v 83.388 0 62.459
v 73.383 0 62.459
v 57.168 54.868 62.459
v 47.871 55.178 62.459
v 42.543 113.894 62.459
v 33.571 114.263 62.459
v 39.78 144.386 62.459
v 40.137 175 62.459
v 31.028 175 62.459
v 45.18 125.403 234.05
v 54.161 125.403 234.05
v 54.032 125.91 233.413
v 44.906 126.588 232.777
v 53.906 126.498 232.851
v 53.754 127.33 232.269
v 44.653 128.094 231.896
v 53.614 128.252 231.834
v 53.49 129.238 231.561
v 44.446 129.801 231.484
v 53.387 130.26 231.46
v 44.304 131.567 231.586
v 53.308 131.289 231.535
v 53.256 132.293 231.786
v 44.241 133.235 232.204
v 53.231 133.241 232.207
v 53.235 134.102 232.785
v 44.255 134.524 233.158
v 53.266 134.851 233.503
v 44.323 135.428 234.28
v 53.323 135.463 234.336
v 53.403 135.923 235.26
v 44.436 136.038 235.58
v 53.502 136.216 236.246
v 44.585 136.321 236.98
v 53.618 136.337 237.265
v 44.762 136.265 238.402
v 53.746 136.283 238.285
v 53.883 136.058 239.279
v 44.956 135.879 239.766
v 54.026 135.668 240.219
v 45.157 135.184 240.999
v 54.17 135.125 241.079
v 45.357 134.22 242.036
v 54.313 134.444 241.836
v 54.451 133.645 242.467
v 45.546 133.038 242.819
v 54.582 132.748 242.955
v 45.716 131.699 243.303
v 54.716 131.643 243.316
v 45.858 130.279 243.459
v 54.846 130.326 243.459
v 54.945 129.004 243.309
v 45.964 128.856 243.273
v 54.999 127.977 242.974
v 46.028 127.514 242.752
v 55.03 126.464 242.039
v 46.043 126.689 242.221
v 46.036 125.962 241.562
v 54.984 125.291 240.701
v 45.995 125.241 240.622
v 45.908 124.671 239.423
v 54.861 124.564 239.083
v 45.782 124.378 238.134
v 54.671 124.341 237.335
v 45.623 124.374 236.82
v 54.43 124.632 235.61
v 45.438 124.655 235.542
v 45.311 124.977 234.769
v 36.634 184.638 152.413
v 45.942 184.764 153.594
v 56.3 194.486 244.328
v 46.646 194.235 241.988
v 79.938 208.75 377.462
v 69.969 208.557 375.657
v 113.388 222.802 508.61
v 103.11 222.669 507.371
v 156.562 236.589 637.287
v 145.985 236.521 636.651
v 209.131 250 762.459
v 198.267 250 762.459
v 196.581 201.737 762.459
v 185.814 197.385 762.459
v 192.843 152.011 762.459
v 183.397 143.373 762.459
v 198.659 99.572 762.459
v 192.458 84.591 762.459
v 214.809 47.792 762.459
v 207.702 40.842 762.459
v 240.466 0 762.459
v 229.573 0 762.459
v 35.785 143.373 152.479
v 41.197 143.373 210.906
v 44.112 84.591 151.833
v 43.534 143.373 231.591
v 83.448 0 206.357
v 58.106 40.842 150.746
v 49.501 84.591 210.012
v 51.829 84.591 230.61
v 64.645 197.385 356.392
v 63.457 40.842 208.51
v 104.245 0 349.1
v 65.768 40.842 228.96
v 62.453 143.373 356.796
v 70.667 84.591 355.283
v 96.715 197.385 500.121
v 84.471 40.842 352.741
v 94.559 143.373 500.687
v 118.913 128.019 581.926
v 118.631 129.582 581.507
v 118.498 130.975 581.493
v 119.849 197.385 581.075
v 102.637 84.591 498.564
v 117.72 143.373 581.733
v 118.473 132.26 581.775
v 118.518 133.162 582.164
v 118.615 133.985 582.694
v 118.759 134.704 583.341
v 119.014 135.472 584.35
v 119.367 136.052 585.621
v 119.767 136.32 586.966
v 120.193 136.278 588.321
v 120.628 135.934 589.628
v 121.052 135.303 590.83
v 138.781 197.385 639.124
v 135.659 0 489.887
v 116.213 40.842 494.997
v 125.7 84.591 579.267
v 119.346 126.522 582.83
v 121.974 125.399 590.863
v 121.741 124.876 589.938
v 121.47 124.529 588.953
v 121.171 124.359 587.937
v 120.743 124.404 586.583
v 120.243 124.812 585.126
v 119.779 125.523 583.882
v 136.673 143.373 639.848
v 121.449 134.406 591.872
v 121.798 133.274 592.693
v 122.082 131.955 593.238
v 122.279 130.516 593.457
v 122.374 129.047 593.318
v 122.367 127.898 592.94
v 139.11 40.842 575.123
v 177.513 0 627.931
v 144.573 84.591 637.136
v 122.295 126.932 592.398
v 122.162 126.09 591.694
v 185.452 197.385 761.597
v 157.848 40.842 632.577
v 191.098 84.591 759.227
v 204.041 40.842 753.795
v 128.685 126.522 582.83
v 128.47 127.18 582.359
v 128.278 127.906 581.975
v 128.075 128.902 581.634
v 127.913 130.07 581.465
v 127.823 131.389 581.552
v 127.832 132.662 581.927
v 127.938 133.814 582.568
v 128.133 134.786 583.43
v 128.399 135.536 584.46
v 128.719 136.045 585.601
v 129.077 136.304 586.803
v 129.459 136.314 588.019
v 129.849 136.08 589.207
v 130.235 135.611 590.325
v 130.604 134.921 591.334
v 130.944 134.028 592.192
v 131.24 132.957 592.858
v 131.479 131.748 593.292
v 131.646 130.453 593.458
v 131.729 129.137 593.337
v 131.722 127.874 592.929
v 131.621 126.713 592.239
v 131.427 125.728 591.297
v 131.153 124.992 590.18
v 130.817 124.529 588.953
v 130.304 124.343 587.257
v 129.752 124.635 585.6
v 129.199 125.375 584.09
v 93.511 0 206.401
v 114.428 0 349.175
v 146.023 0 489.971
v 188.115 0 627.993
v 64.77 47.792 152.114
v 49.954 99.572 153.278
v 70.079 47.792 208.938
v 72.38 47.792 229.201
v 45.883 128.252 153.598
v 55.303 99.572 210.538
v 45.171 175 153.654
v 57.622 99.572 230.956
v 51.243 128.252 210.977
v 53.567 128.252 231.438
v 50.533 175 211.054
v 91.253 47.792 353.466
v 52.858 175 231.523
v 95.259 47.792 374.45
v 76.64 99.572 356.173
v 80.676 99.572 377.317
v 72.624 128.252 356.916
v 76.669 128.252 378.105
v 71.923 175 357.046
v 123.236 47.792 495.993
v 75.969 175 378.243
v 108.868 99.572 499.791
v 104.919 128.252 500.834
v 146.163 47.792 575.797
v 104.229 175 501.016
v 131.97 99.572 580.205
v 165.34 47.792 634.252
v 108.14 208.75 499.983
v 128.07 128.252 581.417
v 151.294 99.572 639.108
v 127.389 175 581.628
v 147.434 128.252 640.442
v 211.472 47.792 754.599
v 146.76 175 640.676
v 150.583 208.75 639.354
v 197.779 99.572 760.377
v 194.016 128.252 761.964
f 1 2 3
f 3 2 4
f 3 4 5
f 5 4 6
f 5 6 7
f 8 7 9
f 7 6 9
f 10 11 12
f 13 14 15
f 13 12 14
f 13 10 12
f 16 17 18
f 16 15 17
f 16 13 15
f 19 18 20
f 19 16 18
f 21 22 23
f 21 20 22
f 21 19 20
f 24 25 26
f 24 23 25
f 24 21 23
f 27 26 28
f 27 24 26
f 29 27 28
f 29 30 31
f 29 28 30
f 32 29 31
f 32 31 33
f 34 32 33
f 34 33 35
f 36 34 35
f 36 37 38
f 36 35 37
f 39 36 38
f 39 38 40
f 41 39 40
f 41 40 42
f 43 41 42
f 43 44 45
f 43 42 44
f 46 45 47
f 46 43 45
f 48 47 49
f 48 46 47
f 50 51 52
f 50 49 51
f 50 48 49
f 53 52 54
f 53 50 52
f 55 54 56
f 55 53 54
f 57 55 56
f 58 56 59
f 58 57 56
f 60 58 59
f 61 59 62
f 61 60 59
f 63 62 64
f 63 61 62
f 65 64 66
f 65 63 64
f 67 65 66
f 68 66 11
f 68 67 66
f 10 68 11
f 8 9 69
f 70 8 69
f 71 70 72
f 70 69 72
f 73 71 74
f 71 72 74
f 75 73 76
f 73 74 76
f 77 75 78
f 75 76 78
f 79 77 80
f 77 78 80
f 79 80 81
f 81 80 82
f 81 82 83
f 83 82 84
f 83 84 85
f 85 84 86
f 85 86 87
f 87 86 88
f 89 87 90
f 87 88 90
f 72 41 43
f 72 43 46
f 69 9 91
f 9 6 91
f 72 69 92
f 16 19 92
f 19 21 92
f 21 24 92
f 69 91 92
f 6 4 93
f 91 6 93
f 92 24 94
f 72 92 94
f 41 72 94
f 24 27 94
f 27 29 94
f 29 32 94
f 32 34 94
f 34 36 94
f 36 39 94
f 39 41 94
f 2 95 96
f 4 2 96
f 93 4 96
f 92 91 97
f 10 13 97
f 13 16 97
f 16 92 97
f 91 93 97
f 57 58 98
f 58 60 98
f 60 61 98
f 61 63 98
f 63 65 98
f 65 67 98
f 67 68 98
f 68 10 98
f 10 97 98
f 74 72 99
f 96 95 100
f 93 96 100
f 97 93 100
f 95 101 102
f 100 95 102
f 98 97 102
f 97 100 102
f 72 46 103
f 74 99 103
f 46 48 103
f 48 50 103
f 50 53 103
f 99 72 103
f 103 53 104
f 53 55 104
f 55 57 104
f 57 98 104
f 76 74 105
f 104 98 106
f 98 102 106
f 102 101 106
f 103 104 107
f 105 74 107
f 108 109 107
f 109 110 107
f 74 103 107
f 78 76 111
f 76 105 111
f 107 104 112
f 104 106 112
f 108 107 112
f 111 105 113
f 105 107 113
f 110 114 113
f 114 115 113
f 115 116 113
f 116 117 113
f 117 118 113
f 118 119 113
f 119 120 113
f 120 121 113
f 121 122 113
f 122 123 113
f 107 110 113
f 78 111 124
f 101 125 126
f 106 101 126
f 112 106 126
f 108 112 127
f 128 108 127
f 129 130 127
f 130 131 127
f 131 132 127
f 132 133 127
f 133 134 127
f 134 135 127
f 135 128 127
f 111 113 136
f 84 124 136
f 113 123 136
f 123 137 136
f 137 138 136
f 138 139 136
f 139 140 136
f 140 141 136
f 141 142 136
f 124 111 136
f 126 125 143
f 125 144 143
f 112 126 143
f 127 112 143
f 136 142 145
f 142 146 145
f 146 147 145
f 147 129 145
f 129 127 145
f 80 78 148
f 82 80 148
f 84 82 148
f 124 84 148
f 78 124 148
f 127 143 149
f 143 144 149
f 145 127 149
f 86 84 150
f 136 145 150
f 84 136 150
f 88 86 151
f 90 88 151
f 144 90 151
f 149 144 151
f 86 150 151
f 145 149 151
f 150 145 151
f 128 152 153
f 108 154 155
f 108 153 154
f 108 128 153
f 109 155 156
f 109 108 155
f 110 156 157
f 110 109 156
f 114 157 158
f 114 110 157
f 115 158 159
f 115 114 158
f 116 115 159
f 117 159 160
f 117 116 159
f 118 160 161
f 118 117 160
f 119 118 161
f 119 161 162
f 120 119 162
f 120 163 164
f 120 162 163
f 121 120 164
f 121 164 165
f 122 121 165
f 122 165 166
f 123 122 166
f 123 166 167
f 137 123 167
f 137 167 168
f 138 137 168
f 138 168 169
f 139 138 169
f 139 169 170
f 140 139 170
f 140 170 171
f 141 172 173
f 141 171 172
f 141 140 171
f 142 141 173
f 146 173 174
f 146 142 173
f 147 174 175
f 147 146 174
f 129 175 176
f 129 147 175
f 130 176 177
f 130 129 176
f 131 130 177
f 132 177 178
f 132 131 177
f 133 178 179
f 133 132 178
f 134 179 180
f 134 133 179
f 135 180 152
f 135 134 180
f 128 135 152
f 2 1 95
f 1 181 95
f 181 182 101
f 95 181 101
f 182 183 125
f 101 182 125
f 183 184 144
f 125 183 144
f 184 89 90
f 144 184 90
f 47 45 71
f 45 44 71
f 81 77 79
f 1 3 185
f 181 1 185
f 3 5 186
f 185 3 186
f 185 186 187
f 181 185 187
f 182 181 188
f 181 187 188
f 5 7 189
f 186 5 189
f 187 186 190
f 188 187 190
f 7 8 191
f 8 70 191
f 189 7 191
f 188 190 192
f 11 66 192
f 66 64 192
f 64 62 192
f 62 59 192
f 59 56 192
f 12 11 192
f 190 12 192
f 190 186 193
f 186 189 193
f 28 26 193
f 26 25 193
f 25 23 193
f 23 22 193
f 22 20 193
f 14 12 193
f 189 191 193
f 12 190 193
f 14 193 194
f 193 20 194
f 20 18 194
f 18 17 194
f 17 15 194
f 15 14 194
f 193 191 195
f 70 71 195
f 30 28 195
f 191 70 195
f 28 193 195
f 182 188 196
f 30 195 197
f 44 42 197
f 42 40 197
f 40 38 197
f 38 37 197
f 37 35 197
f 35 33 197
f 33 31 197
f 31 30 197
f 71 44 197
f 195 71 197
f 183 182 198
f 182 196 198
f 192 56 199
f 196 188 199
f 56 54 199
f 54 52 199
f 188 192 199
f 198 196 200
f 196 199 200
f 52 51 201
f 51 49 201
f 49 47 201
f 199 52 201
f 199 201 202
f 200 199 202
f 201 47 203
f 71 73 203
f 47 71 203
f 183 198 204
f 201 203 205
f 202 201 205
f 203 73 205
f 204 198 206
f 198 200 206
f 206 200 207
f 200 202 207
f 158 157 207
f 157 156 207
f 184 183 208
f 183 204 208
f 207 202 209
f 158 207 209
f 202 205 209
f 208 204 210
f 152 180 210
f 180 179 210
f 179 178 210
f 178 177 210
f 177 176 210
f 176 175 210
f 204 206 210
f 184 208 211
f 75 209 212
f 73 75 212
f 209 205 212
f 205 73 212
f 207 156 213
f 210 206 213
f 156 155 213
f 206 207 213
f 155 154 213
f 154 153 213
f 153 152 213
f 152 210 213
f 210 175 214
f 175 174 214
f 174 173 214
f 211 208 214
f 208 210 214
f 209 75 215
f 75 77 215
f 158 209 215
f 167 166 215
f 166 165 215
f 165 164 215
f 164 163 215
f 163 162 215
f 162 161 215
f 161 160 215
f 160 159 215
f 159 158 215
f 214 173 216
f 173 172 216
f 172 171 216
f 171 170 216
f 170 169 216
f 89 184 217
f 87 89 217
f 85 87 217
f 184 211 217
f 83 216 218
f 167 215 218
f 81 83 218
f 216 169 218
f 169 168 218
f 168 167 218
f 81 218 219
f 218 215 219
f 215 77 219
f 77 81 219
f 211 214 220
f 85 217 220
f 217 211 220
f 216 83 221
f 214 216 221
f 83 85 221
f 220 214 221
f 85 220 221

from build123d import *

# Parameters (mm, degrees)
REVOLVE1_ANGLE          = 88
CUT_EXTRUDE2_DEPTH      = 2771.780439466
CUT_EXTRUDE2_DEPTH_BACK = 2771.780439466
SKETCH5_W               = 5800.528681758
SKETCH5_H               = 2435.889164845
CUT_EXTRUDE4_DEPTH      = 838.656303446
CUT_EXTRUDE4_DEPTH_BACK = 838.656303446
SKETCH6_R               = 6


with BuildPart() as part:
    # Sketch2 → Revolve1 (revolve)
    with BuildSketch(Plane.XY):
        with BuildLine():
            Line((72.370392529, 0), (82.370392529, 0))
            ThreePointArc((82.370392529, 0), (40.524594063, 121.838677192), (53.578690935, 250))
            Line((53.578690935, 250), (43.578690935, 250))
            ThreePointArc((43.578690935, 250), (31.595154891, 121.961970263), (72.370392529, 0))
        make_face()
    revolve(axis=Axis((2000, -13.371705106, 0), (0, 1, 0)), revolution_arc=REVOLVE1_ANGLE)

    # Sketch5 → Cut-Extrude2 (cut, two sides: drawn at the far end of the back side and taken through both)
    with BuildSketch(Plane(origin=(0, 0, 0), x_dir=(0, 0, -1), z_dir=(1, 0, 0)).offset(-CUT_EXTRUDE2_DEPTH_BACK)):
        with Locations((76.037885341, -87.116535175)):
            Rectangle(SKETCH5_W, SKETCH5_H)
        Polygon((-762.459239957, 250), (-762.459239957, 0), (-62.459239957, 0), (-62.459239957, 175), align=None, mode=Mode.SUBTRACT)
    extrude(amount=CUT_EXTRUDE2_DEPTH + CUT_EXTRUDE2_DEPTH_BACK, mode=Mode.SUBTRACT)

    # Sketch6 → Cut-Extrude4 (cut, two sides: drawn at the far end of the back side and taken through both)
    with BuildSketch(Plane(origin=(0, 0, 0), x_dir=(0, 0, -1), z_dir=(1, 0, 0)).offset(-CUT_EXTRUDE4_DEPTH_BACK)):
        with Locations(Location((-587.459239957, 130.34, 0), (0, 0, 320.485227815))):
            Circle(SKETCH6_R)
        with Locations(Location((-237.459239957, 130.34, 0), (0, 0, 304.628365323))):
            Circle(SKETCH6_R)
    extrude(amount=CUT_EXTRUDE4_DEPTH + CUT_EXTRUDE4_DEPTH_BACK, mode=Mode.SUBTRACT)


solid = part.part
